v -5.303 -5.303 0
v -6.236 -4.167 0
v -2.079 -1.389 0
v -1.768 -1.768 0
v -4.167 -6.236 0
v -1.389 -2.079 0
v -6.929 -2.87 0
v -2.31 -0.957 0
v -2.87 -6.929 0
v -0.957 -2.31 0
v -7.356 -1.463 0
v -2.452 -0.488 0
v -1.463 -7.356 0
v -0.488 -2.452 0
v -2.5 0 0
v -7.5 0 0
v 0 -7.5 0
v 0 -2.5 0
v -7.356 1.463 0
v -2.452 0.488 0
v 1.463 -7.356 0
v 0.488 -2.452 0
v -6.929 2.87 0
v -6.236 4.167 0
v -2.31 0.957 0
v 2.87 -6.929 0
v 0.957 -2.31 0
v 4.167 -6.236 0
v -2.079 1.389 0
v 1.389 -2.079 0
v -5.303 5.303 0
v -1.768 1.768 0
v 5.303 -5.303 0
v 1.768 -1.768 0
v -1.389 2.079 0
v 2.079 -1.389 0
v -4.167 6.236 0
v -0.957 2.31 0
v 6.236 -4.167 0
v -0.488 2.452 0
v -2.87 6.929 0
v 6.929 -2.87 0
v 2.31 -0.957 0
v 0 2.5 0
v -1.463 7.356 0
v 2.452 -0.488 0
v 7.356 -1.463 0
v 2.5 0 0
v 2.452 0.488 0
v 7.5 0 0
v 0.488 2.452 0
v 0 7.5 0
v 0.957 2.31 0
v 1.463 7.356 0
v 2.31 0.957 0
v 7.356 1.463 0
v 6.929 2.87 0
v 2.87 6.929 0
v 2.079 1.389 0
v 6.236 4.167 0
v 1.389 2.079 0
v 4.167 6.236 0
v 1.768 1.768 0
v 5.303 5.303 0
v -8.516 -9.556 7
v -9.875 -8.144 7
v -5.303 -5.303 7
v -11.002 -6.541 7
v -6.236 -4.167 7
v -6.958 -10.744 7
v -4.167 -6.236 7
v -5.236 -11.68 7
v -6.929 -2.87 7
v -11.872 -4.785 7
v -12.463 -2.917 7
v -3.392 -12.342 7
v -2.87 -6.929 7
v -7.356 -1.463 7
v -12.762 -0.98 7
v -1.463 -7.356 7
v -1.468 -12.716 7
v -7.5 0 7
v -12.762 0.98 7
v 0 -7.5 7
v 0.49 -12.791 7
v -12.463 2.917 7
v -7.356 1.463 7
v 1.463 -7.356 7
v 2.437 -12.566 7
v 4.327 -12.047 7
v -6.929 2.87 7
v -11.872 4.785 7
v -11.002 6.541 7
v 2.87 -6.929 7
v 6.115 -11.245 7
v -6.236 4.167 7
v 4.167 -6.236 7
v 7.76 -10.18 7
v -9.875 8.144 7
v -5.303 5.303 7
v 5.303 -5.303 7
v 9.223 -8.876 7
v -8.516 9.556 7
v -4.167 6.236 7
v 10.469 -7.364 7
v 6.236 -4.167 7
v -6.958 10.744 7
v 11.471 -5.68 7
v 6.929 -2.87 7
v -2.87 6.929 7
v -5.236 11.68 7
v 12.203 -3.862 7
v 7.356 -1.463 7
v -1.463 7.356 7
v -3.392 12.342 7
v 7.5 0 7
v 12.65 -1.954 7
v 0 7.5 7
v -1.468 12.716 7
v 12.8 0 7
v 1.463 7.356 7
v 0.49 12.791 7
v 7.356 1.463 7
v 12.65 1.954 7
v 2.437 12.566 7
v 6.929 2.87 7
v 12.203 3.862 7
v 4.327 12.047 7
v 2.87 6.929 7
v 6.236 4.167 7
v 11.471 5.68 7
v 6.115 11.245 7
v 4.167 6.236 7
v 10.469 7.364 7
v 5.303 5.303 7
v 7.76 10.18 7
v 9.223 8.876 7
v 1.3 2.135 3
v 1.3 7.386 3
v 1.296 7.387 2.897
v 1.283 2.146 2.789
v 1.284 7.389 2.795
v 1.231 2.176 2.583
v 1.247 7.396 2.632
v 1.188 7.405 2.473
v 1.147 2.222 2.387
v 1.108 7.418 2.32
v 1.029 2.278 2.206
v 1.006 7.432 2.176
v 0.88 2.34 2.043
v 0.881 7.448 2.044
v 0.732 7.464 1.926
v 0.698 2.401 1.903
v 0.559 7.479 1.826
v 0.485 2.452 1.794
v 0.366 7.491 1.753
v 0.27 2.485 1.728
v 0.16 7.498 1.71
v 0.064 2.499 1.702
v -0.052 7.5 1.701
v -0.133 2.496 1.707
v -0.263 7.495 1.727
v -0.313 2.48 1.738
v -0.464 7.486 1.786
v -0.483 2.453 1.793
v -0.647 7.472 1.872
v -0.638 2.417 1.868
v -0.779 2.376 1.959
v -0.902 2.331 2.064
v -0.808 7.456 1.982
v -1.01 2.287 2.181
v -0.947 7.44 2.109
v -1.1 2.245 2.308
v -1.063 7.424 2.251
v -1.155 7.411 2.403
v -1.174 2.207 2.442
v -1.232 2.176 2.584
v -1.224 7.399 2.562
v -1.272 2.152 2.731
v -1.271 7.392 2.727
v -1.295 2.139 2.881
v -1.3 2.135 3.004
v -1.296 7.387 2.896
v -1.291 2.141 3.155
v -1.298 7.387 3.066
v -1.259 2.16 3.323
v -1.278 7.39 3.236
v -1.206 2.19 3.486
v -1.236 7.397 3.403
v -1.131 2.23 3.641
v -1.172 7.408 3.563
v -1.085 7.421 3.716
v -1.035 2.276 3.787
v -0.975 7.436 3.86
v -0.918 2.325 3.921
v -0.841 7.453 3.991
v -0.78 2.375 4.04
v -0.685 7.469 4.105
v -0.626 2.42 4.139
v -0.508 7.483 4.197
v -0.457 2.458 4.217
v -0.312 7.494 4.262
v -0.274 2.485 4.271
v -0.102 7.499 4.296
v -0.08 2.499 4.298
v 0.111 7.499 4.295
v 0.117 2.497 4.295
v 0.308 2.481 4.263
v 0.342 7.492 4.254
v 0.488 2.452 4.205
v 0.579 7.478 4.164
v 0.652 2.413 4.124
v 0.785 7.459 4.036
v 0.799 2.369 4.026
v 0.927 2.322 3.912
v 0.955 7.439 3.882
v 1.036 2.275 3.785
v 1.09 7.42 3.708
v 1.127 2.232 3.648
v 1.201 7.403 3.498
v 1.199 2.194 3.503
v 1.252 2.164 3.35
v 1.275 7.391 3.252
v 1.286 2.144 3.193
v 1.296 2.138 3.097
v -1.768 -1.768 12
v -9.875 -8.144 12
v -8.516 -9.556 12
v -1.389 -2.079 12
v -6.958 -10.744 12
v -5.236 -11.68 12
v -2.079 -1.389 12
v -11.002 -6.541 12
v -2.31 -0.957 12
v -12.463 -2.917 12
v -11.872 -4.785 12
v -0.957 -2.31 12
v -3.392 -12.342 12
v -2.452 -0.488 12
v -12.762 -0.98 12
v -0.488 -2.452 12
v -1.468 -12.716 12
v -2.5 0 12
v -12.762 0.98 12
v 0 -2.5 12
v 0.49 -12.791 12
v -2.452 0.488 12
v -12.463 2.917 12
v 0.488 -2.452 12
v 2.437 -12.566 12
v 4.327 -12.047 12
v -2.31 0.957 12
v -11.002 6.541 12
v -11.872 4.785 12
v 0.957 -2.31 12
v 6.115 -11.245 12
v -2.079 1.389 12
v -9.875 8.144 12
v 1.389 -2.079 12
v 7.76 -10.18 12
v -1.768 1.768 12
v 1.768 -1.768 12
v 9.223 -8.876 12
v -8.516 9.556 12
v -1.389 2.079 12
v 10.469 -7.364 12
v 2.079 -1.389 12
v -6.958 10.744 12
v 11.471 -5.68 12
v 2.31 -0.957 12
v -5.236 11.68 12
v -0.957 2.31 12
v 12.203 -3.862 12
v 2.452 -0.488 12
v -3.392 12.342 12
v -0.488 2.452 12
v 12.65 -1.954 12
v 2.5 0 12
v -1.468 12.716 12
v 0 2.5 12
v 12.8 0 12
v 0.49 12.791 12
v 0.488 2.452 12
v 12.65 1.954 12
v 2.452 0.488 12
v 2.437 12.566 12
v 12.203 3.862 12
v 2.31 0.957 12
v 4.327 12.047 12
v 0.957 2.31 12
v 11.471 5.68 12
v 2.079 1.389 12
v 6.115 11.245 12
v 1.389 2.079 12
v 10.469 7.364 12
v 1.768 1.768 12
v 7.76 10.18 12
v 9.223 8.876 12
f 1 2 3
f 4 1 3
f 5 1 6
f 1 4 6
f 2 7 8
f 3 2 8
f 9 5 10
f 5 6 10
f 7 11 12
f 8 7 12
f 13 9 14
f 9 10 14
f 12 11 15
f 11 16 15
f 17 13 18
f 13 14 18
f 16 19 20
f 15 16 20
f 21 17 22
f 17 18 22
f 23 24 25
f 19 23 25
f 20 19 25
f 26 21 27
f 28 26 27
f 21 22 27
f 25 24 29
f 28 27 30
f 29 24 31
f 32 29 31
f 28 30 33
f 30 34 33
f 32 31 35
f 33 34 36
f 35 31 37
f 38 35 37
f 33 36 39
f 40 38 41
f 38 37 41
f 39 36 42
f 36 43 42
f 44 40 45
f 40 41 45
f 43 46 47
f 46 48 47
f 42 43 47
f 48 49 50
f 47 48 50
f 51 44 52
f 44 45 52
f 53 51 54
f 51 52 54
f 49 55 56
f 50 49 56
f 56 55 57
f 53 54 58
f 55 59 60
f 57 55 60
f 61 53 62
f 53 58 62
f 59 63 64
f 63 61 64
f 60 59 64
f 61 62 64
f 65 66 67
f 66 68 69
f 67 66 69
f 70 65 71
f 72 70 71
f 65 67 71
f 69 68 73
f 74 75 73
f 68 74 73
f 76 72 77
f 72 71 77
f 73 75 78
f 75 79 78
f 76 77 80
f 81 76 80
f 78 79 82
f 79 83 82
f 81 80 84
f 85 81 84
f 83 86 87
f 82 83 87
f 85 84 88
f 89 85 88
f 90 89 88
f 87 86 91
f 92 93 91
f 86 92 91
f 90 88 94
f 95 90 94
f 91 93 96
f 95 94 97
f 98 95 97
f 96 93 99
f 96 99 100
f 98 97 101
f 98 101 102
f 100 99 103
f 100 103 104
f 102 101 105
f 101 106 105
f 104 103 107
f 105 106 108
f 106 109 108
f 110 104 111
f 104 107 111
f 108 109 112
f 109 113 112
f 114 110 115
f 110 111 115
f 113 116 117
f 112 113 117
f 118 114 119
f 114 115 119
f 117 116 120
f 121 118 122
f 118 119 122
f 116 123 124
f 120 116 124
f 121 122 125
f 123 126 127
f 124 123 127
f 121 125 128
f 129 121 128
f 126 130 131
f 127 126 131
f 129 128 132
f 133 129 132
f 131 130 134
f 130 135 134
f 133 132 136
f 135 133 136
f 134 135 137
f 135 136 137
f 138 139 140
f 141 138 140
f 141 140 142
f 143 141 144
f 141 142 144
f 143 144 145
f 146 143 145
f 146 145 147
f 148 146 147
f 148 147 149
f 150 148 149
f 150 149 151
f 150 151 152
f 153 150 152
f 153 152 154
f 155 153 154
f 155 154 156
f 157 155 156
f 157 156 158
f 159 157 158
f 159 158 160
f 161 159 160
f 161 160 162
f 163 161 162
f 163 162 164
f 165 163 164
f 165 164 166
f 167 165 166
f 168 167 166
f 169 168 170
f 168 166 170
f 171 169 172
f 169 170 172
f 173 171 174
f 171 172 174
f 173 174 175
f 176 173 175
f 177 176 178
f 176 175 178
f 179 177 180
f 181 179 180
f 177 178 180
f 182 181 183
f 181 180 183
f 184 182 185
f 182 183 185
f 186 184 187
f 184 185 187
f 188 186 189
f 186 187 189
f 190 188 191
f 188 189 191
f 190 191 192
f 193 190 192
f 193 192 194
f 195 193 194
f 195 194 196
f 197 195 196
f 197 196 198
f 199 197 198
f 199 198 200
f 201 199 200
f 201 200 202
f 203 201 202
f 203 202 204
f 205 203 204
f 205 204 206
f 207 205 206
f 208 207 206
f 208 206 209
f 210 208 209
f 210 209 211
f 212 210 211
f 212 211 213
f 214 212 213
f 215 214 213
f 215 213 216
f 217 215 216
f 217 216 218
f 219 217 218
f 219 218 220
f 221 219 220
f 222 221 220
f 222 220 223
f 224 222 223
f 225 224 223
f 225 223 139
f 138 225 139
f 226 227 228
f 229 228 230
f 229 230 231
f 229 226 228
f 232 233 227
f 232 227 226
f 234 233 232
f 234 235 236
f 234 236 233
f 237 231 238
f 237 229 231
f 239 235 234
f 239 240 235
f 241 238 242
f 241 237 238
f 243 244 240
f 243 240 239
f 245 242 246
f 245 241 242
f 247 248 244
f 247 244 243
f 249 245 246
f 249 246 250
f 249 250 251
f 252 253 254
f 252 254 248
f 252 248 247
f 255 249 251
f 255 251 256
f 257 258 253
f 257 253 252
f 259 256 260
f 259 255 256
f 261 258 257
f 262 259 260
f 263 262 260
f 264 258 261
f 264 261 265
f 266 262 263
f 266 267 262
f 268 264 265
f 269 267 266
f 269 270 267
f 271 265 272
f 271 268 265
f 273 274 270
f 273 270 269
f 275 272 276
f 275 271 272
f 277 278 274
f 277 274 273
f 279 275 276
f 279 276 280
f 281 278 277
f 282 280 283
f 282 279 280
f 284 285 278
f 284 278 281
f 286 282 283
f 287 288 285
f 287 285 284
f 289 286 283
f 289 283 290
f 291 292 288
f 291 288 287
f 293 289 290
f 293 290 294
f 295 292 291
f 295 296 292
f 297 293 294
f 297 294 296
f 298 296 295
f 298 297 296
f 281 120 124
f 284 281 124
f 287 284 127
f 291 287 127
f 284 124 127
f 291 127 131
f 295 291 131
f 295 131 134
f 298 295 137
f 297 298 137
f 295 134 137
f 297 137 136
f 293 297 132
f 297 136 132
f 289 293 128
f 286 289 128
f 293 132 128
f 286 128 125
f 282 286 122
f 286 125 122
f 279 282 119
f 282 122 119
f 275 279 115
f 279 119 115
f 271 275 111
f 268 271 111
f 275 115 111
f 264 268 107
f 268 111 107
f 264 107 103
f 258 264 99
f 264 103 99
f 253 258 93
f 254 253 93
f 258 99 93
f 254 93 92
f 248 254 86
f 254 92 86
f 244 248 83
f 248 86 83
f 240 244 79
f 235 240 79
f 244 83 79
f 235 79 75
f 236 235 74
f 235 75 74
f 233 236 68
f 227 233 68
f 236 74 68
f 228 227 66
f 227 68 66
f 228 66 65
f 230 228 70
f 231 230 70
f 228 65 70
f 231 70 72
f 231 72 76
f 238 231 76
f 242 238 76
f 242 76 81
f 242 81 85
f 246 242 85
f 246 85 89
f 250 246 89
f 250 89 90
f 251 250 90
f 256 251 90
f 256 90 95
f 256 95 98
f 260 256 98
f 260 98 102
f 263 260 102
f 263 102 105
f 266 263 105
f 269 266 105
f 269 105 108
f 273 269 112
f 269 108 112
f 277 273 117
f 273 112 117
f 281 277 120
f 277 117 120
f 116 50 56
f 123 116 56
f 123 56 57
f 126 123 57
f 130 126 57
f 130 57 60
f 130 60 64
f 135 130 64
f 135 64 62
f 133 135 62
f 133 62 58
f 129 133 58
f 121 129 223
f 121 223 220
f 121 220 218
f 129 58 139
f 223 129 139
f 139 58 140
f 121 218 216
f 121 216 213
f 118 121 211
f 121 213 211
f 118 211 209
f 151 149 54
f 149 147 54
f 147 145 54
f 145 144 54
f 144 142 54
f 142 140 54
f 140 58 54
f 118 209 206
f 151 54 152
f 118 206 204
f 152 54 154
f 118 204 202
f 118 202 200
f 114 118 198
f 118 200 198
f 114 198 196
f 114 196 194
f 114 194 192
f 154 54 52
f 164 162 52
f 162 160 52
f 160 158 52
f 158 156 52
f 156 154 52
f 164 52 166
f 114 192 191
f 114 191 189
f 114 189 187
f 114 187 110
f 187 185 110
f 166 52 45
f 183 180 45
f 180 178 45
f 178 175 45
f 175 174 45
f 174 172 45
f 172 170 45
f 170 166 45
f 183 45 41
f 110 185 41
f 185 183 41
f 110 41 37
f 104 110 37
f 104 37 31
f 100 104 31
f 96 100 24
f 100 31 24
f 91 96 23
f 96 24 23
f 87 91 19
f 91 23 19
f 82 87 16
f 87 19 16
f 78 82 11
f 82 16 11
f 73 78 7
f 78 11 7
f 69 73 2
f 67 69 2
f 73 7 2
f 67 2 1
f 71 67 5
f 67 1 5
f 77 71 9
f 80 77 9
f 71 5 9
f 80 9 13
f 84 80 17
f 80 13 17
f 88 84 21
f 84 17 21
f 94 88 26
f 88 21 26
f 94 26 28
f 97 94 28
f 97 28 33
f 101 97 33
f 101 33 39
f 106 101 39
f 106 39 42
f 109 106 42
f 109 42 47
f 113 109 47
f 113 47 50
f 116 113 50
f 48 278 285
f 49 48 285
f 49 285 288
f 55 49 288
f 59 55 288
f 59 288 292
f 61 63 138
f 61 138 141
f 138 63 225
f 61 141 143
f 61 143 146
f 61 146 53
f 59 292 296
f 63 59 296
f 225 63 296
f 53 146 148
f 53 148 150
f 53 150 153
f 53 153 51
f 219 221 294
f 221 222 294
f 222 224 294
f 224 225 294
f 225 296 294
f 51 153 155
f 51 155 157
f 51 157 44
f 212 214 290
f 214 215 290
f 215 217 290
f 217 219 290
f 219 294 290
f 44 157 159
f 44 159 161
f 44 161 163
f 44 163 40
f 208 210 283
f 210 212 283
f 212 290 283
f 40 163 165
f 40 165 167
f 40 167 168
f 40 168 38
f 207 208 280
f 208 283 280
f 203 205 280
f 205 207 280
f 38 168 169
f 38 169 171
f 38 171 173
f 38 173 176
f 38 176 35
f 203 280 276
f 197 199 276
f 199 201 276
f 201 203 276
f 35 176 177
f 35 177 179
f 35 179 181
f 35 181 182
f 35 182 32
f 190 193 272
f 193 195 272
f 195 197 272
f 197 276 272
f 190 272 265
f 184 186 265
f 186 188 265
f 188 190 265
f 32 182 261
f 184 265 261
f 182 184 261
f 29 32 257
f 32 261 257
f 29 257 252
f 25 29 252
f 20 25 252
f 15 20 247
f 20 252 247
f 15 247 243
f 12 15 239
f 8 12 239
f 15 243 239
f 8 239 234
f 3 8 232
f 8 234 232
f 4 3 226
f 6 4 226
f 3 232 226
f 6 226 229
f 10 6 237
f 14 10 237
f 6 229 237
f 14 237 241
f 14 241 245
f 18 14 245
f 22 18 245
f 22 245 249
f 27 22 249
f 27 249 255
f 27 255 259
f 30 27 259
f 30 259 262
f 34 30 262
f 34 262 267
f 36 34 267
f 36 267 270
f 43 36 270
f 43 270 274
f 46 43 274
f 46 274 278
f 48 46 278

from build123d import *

# Parameters (mm, degrees)
SKETCH1_R                        = 7.5
BOSS_EXTRUDE1_DEPTH              = 7
SKETCH2_R                        = 12.8
BOSS_EXTRUDE2_DEPTH              = 5
SKETCH3_R                        = 2.5
CUT_EXTRUDE1_DEPTH               = 22.718195137
TAP_DRILL_FOR_M3X0_5_TAP1_REACH  = 27.631
TAP_DRILL_FOR_M3X0_5_TAP1_BORE_R = 1.3


with BuildPart() as part:
    # Sketch1 → Boss-Extrude1 (new body)
    with BuildSketch(Plane.XY):
        Circle(SKETCH1_R)
    extrude(amount=BOSS_EXTRUDE1_DEPTH)

    # Sketch2 → Boss-Extrude2 (add)
    with BuildSketch(Plane.XY.offset(7)):
        Circle(SKETCH2_R)
    extrude(amount=BOSS_EXTRUDE2_DEPTH)

    # Sketch3 → Cut-Extrude1 (cut, through all)
    with BuildSketch(Plane.XY.offset(12)):
        Circle(SKETCH3_R)
    extrude(amount=-CUT_EXTRUDE1_DEPTH, mode=Mode.SUBTRACT)

    # Tap Drill for M3x0.5 Tap1 bore (on position points) → Tap Drill for M3x0.5 Tap1 (cut, up to next)
    with BuildSketch(Plane(origin=(0, 7.5, 3), x_dir=(1, 0, 0), z_dir=(0, 1, 0)), mode=Mode.PRIVATE) as tap_drill_for_m3x0_5_tap1_sk1:
        Circle(TAP_DRILL_FOR_M3X0_5_TAP1_BORE_R)
    tap_drill_for_m3x0_5_tap1_tool1 = extrude(tap_drill_for_m3x0_5_tap1_sk1.sketch, amount=-TAP_DRILL_FOR_M3X0_5_TAP1_REACH, mode=Mode.PRIVATE) & part.part
    add(tap_drill_for_m3x0_5_tap1_tool1.solids().sort_by_distance((0, 7.5, 3))[0], mode=Mode.SUBTRACT)


solid = part.part
